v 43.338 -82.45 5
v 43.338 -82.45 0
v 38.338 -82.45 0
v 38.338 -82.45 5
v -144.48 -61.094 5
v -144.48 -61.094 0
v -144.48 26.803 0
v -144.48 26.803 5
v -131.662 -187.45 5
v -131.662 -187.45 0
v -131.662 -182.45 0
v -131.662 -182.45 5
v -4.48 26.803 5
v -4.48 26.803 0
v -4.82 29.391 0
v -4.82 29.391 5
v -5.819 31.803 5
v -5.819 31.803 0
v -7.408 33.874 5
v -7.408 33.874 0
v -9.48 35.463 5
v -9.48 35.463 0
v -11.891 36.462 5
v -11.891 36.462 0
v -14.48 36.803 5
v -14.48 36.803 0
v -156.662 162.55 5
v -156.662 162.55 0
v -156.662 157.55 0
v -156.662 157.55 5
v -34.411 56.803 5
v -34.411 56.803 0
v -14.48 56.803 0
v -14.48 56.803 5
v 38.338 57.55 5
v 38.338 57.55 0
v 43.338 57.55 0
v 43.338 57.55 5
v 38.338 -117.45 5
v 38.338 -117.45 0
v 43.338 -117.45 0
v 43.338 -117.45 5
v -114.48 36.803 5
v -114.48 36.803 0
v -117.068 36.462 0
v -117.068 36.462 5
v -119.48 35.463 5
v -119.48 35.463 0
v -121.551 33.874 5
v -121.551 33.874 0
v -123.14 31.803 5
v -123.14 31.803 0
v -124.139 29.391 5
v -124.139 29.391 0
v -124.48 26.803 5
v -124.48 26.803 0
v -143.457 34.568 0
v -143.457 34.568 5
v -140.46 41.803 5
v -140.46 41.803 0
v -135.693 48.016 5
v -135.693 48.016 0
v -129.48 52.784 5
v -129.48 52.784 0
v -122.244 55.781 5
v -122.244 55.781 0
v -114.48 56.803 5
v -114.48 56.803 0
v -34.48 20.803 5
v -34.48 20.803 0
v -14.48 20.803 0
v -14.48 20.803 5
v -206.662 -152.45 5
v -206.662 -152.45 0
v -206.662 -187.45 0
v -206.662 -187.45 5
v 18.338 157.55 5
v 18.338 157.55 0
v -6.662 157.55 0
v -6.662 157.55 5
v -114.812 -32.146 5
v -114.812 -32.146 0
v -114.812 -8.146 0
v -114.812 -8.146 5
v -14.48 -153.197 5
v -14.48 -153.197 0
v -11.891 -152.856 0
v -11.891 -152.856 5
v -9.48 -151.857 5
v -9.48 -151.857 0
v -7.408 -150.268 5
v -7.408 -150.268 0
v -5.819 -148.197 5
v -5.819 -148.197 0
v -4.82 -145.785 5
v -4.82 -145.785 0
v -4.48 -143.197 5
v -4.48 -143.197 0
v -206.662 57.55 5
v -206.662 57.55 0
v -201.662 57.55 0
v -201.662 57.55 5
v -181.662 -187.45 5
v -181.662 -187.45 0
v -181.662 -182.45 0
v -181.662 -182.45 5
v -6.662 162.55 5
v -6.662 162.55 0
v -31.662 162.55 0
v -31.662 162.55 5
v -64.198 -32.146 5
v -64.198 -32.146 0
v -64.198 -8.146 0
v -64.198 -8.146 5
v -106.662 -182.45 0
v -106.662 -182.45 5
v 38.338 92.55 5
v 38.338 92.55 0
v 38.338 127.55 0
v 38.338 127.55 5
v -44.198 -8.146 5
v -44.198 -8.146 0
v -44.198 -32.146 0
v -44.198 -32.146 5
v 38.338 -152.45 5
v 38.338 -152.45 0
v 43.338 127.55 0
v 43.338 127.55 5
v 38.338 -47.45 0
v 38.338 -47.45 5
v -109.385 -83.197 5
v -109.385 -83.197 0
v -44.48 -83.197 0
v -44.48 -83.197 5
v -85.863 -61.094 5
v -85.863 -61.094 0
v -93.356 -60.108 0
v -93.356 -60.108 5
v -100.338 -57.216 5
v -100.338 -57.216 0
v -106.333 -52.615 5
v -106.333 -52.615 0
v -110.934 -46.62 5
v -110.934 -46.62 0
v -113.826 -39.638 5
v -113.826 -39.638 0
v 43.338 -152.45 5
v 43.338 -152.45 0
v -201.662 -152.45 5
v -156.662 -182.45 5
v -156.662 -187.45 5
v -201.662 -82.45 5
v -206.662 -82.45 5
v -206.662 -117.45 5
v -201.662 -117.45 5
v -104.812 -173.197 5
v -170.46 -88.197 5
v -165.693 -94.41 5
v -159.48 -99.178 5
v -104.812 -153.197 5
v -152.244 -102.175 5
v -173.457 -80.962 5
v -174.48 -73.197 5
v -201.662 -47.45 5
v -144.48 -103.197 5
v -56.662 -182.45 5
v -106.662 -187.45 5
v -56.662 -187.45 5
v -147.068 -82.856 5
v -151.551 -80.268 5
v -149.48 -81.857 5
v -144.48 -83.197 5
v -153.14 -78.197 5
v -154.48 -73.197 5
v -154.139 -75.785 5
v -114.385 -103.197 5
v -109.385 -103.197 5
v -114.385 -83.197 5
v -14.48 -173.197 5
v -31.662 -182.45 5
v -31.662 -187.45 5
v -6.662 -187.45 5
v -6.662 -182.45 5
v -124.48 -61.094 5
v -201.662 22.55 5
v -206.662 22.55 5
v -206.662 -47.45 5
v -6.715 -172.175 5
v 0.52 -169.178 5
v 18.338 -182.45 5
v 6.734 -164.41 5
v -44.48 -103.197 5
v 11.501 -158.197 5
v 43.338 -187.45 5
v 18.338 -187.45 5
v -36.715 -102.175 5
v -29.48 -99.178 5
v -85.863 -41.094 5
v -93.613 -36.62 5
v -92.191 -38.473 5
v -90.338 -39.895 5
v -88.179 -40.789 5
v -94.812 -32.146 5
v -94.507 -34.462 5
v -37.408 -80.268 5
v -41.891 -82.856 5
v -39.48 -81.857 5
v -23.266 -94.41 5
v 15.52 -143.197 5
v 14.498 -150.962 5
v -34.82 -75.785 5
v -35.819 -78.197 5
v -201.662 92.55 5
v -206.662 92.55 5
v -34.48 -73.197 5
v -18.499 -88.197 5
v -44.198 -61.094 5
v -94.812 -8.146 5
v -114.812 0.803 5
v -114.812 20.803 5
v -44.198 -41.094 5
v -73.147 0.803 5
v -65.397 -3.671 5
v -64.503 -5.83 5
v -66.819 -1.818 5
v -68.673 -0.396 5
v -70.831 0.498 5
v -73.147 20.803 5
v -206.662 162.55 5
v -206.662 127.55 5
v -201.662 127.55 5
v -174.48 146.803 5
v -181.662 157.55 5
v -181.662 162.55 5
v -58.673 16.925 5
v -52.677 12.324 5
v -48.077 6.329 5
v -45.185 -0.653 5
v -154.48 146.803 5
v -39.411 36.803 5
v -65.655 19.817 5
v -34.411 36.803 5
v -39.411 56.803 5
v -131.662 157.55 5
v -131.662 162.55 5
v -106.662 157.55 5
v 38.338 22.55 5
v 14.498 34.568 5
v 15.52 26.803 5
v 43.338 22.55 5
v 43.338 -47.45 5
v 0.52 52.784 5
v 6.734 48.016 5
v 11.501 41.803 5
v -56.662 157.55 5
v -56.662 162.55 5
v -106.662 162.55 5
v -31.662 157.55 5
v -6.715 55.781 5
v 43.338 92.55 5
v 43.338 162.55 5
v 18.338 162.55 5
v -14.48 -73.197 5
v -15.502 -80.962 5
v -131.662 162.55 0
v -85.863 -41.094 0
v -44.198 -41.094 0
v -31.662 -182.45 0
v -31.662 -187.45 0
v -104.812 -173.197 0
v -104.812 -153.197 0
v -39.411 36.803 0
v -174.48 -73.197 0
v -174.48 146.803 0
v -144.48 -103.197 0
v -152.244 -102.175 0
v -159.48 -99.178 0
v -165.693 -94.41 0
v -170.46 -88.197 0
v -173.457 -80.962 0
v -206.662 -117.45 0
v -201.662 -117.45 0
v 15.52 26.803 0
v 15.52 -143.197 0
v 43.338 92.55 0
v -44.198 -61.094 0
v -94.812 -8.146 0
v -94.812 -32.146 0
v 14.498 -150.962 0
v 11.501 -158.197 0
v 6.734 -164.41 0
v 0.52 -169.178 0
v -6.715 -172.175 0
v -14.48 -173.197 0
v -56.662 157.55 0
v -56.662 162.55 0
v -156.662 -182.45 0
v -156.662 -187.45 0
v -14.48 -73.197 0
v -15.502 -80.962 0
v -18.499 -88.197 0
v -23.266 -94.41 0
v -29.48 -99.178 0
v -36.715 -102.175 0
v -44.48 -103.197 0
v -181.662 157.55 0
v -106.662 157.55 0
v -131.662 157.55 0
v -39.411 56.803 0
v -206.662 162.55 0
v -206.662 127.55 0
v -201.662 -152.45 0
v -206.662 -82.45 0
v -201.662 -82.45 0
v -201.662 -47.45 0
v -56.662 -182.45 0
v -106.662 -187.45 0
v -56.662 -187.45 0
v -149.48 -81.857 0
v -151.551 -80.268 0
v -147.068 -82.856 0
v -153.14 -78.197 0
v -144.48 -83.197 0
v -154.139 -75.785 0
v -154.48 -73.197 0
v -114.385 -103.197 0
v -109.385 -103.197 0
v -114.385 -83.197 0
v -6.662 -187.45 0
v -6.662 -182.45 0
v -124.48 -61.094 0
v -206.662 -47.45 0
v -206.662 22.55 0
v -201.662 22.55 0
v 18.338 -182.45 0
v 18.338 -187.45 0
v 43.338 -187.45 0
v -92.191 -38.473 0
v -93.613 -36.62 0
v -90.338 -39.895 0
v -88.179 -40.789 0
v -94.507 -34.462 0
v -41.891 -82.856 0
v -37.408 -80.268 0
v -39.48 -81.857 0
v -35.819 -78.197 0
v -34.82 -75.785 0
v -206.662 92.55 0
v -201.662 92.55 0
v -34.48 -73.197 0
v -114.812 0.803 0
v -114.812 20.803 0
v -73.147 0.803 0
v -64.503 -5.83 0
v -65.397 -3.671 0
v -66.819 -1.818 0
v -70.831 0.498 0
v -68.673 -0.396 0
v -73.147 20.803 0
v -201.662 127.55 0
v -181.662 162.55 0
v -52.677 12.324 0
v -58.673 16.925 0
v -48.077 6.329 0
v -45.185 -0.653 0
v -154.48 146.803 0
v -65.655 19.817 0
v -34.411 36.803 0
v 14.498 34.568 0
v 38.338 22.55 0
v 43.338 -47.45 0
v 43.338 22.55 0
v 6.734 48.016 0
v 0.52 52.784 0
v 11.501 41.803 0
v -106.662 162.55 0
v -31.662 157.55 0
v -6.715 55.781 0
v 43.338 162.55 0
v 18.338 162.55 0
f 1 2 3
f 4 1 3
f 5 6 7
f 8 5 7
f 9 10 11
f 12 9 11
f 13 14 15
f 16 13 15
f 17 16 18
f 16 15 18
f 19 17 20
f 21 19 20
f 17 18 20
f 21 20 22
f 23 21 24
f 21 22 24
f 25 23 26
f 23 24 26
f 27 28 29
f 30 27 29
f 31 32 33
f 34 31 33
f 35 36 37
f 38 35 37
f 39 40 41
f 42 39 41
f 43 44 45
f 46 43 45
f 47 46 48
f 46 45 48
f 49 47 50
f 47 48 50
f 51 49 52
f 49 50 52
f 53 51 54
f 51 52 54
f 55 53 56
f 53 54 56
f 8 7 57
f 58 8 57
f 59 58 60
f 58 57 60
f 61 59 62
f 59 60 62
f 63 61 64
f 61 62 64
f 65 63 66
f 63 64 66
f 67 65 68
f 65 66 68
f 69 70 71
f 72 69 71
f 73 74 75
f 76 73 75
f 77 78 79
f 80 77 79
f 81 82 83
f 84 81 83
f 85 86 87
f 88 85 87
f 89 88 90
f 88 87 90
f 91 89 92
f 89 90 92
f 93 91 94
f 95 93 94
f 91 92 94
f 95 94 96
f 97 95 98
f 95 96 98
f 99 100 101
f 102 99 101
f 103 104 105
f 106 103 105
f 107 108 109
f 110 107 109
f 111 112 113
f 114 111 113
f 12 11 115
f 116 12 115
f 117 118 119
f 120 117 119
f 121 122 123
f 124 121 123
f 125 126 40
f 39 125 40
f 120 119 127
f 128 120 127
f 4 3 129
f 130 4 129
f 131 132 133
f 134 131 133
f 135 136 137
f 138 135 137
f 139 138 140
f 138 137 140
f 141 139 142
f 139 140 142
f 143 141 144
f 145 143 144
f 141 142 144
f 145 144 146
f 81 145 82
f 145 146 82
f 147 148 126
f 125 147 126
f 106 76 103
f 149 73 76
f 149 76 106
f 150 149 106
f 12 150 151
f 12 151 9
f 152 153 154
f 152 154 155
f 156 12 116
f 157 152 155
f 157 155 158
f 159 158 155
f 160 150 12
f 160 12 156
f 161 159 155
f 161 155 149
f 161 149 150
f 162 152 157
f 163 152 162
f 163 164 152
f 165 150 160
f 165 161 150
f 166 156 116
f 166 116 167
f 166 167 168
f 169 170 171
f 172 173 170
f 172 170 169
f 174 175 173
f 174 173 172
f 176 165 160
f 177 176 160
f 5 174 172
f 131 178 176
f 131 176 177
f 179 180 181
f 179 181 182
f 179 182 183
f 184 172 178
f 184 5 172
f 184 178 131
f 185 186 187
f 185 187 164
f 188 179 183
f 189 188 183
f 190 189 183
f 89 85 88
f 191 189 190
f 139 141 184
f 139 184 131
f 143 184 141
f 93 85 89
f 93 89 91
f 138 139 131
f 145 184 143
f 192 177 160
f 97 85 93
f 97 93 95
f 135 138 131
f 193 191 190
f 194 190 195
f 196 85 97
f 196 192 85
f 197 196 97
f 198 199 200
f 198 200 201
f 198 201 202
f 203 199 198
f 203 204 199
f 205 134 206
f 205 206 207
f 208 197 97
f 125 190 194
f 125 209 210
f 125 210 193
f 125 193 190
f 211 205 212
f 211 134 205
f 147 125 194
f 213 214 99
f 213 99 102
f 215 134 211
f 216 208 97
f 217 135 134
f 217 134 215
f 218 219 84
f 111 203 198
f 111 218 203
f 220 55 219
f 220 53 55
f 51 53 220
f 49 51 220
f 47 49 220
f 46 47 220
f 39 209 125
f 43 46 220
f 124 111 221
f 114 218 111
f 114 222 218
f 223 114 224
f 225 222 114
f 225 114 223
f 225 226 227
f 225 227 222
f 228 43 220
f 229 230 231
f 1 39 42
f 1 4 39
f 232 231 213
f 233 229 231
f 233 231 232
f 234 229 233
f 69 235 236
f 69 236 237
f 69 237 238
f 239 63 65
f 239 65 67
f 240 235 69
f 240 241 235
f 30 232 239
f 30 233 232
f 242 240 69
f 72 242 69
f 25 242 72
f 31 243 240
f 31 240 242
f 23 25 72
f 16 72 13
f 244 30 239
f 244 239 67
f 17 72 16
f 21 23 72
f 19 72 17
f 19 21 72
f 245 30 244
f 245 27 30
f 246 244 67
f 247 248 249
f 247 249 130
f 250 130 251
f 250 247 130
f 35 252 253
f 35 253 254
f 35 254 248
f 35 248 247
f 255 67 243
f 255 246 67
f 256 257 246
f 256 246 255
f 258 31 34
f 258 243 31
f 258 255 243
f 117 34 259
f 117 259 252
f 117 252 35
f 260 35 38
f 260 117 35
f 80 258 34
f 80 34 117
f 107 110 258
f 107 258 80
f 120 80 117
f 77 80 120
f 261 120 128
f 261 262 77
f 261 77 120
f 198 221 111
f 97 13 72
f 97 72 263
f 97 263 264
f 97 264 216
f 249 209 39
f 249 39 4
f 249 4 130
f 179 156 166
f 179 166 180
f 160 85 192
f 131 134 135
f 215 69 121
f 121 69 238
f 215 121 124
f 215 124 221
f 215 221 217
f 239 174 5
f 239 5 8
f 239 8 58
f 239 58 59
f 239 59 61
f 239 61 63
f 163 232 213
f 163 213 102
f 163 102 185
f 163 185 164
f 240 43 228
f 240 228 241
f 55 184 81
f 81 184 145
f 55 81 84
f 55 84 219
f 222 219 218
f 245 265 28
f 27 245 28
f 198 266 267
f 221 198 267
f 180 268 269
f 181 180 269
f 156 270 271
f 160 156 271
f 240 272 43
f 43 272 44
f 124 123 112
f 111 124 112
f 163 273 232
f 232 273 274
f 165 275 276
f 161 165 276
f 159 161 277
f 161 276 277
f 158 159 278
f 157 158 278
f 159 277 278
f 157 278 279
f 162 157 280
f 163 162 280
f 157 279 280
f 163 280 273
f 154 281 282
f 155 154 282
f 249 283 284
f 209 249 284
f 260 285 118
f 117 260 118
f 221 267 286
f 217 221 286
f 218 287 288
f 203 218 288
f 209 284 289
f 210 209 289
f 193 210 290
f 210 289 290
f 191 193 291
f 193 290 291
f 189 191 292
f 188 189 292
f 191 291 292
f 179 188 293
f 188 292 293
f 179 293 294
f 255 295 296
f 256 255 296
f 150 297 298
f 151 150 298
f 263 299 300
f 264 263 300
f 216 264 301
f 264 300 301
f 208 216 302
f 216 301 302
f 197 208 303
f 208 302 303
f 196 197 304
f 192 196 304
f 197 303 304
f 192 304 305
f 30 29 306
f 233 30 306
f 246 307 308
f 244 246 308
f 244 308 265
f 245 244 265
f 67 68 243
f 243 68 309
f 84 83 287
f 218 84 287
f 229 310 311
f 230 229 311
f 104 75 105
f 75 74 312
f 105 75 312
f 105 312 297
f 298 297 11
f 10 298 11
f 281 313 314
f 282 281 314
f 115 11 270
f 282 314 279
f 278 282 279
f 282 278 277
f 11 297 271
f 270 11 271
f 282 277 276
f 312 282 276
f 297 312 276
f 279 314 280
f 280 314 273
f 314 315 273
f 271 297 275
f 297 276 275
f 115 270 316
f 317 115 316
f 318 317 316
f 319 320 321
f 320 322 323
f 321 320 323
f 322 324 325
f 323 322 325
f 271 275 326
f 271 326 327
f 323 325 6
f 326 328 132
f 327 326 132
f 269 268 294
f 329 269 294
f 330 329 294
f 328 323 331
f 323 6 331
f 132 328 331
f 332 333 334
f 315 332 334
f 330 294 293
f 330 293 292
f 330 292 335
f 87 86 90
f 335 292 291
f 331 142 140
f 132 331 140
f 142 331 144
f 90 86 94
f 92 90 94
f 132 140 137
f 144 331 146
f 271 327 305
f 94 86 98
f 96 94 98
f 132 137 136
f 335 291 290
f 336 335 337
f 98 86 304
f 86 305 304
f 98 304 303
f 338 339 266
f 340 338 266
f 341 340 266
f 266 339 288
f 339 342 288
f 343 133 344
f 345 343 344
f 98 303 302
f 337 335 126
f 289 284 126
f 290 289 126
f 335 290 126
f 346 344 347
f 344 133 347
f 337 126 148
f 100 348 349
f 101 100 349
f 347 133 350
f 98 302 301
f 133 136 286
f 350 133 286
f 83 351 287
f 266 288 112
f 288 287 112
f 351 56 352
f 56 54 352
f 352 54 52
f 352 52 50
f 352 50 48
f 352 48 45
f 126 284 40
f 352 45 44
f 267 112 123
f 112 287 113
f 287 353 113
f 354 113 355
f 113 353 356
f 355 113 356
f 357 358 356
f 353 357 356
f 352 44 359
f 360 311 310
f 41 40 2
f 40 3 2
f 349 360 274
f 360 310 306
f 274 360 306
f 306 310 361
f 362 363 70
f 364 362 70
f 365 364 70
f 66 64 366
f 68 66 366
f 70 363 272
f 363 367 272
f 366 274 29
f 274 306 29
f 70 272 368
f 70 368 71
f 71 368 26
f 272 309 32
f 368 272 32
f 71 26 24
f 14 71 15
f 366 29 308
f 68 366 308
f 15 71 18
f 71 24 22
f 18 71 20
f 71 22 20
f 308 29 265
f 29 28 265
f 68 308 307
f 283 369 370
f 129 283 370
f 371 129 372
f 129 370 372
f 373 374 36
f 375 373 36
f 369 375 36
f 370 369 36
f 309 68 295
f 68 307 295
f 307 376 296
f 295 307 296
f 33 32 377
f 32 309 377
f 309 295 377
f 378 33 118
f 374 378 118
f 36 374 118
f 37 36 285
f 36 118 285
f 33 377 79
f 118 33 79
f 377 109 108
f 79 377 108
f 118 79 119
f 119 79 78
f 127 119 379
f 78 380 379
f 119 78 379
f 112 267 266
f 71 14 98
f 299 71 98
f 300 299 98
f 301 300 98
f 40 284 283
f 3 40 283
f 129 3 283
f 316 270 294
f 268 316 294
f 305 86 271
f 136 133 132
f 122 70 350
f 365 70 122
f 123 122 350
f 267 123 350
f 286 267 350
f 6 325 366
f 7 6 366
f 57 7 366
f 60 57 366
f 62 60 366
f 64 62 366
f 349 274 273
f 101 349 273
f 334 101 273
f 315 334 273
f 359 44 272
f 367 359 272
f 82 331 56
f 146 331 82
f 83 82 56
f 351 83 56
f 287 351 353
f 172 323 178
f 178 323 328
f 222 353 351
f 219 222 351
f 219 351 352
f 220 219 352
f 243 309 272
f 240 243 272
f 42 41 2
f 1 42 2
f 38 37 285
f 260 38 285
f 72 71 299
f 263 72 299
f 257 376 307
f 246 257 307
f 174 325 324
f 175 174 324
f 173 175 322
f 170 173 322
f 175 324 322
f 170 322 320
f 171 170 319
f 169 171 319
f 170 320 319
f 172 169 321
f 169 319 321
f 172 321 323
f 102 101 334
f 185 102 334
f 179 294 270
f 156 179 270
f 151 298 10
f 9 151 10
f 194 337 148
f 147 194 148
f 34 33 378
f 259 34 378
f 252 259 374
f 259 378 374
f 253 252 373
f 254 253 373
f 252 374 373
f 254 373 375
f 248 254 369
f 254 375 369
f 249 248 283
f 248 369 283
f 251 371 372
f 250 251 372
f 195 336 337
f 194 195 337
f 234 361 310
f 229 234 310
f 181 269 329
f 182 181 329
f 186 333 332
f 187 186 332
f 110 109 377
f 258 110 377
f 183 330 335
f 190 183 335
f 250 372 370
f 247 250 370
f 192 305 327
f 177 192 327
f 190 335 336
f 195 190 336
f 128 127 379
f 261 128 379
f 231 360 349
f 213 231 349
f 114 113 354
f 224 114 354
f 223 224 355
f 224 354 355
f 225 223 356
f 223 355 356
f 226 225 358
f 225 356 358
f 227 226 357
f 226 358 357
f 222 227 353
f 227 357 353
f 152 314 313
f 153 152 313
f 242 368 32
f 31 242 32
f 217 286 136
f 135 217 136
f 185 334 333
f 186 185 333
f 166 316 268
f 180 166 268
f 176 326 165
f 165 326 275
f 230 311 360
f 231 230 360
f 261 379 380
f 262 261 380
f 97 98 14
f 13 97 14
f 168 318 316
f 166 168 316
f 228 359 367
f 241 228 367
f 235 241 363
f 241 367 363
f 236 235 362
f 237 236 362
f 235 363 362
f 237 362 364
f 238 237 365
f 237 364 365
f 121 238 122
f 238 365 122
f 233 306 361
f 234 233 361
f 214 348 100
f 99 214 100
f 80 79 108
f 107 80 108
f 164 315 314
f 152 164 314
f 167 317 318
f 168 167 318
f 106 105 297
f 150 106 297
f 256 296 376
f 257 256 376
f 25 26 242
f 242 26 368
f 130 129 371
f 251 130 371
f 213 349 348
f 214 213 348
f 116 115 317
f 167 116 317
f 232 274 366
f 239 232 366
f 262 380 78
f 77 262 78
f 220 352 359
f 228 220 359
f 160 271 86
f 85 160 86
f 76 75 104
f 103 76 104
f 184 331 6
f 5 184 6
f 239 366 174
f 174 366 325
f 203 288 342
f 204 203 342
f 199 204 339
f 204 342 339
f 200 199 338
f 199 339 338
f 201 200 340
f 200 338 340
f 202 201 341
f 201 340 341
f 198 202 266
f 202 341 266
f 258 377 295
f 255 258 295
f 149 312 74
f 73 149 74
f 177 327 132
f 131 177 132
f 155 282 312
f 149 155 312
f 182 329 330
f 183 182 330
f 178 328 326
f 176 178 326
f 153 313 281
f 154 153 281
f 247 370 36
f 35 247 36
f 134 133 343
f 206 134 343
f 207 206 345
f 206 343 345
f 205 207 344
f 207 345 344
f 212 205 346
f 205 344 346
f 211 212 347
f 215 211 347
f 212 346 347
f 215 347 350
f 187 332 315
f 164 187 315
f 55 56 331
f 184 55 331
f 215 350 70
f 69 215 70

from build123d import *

# Parameters (mm, degrees)
F1_DEPTH = 5


with BuildPart() as f1:
    # F0 (on Top) → F1 (new body)
    with BuildSketch(Plane.XY):
        Polygon((38.337818, -187.449847), (43.337818, -187.449847), (43.337818, -182.449847), (43.337818, -152.449847), (38.337818, -152.449847), (38.337818, -117.449847), (43.337818, -117.449847), (43.337818, -82.449847), (38.337818, -82.449847), (38.337818, -47.449847), (43.337818, -47.449847), (43.337818, 22.550153), (38.337818, 22.550153), (38.337818, 57.550153), (43.337818, 57.550153), (43.337818, 92.550153), (38.337818, 92.550153), (38.337818, 127.550153), (43.337818, 127.550153), (43.337818, 157.550153), (43.337818, 162.550153), (18.337818, 162.550153), (18.337818, 157.550153), (-6.662182, 157.550153), (-6.662182, 162.550153), (-31.662182, 162.550153), (-31.662182, 157.550153), (-56.662182, 157.550153), (-56.662182, 162.550153), (-81.662182, 162.550153), (-106.662182, 162.550153), (-106.662182, 157.550153), (-131.662182, 157.550153), (-131.662182, 162.550153), (-156.662182, 162.550153), (-156.662182, 157.550153), (-181.662182, 157.550153), (-181.662182, 162.550153), (-206.662182, 162.550153), (-206.662182, 127.550153), (-201.662182, 127.550153), (-201.662182, 92.550153), (-206.662182, 92.550153), (-206.662182, 57.550153), (-201.662182, 57.550153), (-201.662182, 22.550153), (-206.662182, 22.550153), (-206.662182, -12.449847), (-206.662182, -47.449847), (-201.662182, -47.449847), (-201.662182, -82.449847), (-206.662182, -82.449847), (-206.662182, -117.449847), (-201.662182, -117.449847), (-201.662182, -152.449847), (-206.662182, -152.449847), (-206.662182, -187.449847), (-201.662182, -187.449847), (-181.662182, -187.449847), (-181.662182, -182.449847), (-156.662182, -182.449847), (-156.662182, -187.449847), (-131.662182, -187.449847), (-131.662182, -182.449847), (-106.662182, -182.449847), (-106.662182, -187.449847), (-81.662182, -187.449847), (-56.662182, -187.449847), (-56.662182, -182.449847), (-31.662182, -182.449847), (-31.662182, -187.449847), (-6.662182, -187.449847), (-6.662182, -182.449847), (18.337818, -182.449847), (18.337818, -187.449847), align=None)
        with BuildLine():
            Line((-4.479525, -143.196979), (-4.479525, 26.803021))
            ThreePointArc((-4.479525, 26.803021), (-7.408457, 33.874089), (-14.479525, 36.803021))
            Line((-14.479525, 36.803021), (-34.410654, 36.803021))
            Line((-34.410654, 36.803021), (-34.410654, 56.803021))
            Line((-34.410654, 56.803021), (-14.479525, 56.803021))
            ThreePointArc((-14.479525, 56.803021), (6.733678, 48.016224), (15.520475, 26.803021))
            Line((15.520475, 26.803021), (15.520475, -143.196979))
            ThreePointArc((15.520475, -143.196979), (6.733678, -164.410183), (-14.479525, -173.196979))
            Line((-14.479525, -173.196979), (-104.812019, -173.196979))
            Line((-104.812019, -173.196979), (-104.812019, -153.196979))
            Line((-104.812019, -153.196979), (-14.479525, -153.196979))
            ThreePointArc((-14.479525, -153.196979), (-7.408457, -150.268047), (-4.479525, -143.196979))
        make_face(mode=Mode.SUBTRACT)
        with BuildLine():
            Line((-94.812019, -8.145639), (-94.812019, -32.145639))
            ThreePointArc((-94.812019, -32.145639), (-92.191017, -38.473298), (-85.863359, -41.0943))
            Line((-85.863359, -41.0943), (-44.198371, -41.0943))
            Line((-44.198371, -41.0943), (-44.198371, -61.0943))
            Line((-44.198371, -61.0943), (-85.863359, -61.0943))
            ThreePointArc((-85.863359, -61.0943), (-106.333153, -52.615433), (-114.812019, -32.145639))
            Line((-114.812019, -32.145639), (-114.812019, -8.145639))
            Line((-114.812019, -8.145639), (-94.812019, -8.145639))
        make_face(mode=Mode.SUBTRACT)
        with BuildLine():
            Line((-109.385459, -83.196979), (-44.479525, -83.196979))
            ThreePointArc((-44.479525, -83.196979), (-37.408457, -80.268047), (-34.479525, -73.196979))
            Line((-34.479525, -73.196979), (-34.479525, 20.803021))
            Line((-34.479525, 20.803021), (-14.479525, 20.803021))
            Line((-14.479525, 20.803021), (-14.479525, -73.196979))
            ThreePointArc((-14.479525, -73.196979), (-23.266322, -94.410183), (-44.479525, -103.196979))
            Line((-44.479525, -103.196979), (-109.385459, -103.196979))
            Line((-109.385459, -103.196979), (-109.385459, -83.196979))
        make_face(mode=Mode.SUBTRACT)
        with BuildLine():
            Line((-154.479525, 146.803021), (-154.479525, -73.196979))
            ThreePointArc((-154.479525, -73.196979), (-151.550593, -80.268047), (-144.479525, -83.196979))
            Line((-144.479525, -83.196979), (-114.385459, -83.196979))
            Line((-114.385459, -83.196979), (-114.385459, -103.196979))
            Line((-114.385459, -103.196979), (-144.479525, -103.196979))
            ThreePointArc((-144.479525, -103.196979), (-165.692728, -94.410183), (-174.479525, -73.196979))
            Line((-174.479525, -73.196979), (-174.479525, 146.803021))
            Line((-174.479525, 146.803021), (-154.479525, 146.803021))
        make_face(mode=Mode.SUBTRACT)
        with BuildLine():
            Line((-39.410654, 36.803021), (-114.479525, 36.803021))
            ThreePointArc((-114.479525, 36.803021), (-121.550593, 33.874089), (-124.479525, 26.803021))
            Line((-124.479525, 26.803021), (-124.479525, -61.0943))
            Line((-124.479525, -61.0943), (-144.479525, -61.0943))
            Line((-144.479525, -61.0943), (-144.479525, 26.803021))
            ThreePointArc((-144.479525, 26.803021), (-135.692728, 48.016224), (-114.479525, 56.803021))
            Line((-114.479525, 56.803021), (-39.410654, 56.803021))
            Line((-39.410654, 56.803021), (-39.410654, 36.803021))
        make_face(mode=Mode.SUBTRACT)
        with BuildLine():
            Line((-44.198371, -32.145639), (-64.198371, -32.145639))
            Line((-64.198371, -32.145639), (-64.198371, -8.145639))
            ThreePointArc((-64.198371, -8.145639), (-66.819373, -1.817981), (-73.147031, 0.803021))
            Line((-73.147031, 0.803021), (-114.812019, 0.803021))
            Line((-114.812019, 0.803021), (-114.812019, 20.803021))
            Line((-114.812019, 20.803021), (-73.147031, 20.803021))
            ThreePointArc((-73.147031, 20.803021), (-52.677237, 12.324154), (-44.198371, -8.145639))
            Line((-44.198371, -8.145639), (-44.198371, -32.145639))
        make_face(mode=Mode.SUBTRACT)
    extrude(amount=F1_DEPTH)


solid = f1.part
